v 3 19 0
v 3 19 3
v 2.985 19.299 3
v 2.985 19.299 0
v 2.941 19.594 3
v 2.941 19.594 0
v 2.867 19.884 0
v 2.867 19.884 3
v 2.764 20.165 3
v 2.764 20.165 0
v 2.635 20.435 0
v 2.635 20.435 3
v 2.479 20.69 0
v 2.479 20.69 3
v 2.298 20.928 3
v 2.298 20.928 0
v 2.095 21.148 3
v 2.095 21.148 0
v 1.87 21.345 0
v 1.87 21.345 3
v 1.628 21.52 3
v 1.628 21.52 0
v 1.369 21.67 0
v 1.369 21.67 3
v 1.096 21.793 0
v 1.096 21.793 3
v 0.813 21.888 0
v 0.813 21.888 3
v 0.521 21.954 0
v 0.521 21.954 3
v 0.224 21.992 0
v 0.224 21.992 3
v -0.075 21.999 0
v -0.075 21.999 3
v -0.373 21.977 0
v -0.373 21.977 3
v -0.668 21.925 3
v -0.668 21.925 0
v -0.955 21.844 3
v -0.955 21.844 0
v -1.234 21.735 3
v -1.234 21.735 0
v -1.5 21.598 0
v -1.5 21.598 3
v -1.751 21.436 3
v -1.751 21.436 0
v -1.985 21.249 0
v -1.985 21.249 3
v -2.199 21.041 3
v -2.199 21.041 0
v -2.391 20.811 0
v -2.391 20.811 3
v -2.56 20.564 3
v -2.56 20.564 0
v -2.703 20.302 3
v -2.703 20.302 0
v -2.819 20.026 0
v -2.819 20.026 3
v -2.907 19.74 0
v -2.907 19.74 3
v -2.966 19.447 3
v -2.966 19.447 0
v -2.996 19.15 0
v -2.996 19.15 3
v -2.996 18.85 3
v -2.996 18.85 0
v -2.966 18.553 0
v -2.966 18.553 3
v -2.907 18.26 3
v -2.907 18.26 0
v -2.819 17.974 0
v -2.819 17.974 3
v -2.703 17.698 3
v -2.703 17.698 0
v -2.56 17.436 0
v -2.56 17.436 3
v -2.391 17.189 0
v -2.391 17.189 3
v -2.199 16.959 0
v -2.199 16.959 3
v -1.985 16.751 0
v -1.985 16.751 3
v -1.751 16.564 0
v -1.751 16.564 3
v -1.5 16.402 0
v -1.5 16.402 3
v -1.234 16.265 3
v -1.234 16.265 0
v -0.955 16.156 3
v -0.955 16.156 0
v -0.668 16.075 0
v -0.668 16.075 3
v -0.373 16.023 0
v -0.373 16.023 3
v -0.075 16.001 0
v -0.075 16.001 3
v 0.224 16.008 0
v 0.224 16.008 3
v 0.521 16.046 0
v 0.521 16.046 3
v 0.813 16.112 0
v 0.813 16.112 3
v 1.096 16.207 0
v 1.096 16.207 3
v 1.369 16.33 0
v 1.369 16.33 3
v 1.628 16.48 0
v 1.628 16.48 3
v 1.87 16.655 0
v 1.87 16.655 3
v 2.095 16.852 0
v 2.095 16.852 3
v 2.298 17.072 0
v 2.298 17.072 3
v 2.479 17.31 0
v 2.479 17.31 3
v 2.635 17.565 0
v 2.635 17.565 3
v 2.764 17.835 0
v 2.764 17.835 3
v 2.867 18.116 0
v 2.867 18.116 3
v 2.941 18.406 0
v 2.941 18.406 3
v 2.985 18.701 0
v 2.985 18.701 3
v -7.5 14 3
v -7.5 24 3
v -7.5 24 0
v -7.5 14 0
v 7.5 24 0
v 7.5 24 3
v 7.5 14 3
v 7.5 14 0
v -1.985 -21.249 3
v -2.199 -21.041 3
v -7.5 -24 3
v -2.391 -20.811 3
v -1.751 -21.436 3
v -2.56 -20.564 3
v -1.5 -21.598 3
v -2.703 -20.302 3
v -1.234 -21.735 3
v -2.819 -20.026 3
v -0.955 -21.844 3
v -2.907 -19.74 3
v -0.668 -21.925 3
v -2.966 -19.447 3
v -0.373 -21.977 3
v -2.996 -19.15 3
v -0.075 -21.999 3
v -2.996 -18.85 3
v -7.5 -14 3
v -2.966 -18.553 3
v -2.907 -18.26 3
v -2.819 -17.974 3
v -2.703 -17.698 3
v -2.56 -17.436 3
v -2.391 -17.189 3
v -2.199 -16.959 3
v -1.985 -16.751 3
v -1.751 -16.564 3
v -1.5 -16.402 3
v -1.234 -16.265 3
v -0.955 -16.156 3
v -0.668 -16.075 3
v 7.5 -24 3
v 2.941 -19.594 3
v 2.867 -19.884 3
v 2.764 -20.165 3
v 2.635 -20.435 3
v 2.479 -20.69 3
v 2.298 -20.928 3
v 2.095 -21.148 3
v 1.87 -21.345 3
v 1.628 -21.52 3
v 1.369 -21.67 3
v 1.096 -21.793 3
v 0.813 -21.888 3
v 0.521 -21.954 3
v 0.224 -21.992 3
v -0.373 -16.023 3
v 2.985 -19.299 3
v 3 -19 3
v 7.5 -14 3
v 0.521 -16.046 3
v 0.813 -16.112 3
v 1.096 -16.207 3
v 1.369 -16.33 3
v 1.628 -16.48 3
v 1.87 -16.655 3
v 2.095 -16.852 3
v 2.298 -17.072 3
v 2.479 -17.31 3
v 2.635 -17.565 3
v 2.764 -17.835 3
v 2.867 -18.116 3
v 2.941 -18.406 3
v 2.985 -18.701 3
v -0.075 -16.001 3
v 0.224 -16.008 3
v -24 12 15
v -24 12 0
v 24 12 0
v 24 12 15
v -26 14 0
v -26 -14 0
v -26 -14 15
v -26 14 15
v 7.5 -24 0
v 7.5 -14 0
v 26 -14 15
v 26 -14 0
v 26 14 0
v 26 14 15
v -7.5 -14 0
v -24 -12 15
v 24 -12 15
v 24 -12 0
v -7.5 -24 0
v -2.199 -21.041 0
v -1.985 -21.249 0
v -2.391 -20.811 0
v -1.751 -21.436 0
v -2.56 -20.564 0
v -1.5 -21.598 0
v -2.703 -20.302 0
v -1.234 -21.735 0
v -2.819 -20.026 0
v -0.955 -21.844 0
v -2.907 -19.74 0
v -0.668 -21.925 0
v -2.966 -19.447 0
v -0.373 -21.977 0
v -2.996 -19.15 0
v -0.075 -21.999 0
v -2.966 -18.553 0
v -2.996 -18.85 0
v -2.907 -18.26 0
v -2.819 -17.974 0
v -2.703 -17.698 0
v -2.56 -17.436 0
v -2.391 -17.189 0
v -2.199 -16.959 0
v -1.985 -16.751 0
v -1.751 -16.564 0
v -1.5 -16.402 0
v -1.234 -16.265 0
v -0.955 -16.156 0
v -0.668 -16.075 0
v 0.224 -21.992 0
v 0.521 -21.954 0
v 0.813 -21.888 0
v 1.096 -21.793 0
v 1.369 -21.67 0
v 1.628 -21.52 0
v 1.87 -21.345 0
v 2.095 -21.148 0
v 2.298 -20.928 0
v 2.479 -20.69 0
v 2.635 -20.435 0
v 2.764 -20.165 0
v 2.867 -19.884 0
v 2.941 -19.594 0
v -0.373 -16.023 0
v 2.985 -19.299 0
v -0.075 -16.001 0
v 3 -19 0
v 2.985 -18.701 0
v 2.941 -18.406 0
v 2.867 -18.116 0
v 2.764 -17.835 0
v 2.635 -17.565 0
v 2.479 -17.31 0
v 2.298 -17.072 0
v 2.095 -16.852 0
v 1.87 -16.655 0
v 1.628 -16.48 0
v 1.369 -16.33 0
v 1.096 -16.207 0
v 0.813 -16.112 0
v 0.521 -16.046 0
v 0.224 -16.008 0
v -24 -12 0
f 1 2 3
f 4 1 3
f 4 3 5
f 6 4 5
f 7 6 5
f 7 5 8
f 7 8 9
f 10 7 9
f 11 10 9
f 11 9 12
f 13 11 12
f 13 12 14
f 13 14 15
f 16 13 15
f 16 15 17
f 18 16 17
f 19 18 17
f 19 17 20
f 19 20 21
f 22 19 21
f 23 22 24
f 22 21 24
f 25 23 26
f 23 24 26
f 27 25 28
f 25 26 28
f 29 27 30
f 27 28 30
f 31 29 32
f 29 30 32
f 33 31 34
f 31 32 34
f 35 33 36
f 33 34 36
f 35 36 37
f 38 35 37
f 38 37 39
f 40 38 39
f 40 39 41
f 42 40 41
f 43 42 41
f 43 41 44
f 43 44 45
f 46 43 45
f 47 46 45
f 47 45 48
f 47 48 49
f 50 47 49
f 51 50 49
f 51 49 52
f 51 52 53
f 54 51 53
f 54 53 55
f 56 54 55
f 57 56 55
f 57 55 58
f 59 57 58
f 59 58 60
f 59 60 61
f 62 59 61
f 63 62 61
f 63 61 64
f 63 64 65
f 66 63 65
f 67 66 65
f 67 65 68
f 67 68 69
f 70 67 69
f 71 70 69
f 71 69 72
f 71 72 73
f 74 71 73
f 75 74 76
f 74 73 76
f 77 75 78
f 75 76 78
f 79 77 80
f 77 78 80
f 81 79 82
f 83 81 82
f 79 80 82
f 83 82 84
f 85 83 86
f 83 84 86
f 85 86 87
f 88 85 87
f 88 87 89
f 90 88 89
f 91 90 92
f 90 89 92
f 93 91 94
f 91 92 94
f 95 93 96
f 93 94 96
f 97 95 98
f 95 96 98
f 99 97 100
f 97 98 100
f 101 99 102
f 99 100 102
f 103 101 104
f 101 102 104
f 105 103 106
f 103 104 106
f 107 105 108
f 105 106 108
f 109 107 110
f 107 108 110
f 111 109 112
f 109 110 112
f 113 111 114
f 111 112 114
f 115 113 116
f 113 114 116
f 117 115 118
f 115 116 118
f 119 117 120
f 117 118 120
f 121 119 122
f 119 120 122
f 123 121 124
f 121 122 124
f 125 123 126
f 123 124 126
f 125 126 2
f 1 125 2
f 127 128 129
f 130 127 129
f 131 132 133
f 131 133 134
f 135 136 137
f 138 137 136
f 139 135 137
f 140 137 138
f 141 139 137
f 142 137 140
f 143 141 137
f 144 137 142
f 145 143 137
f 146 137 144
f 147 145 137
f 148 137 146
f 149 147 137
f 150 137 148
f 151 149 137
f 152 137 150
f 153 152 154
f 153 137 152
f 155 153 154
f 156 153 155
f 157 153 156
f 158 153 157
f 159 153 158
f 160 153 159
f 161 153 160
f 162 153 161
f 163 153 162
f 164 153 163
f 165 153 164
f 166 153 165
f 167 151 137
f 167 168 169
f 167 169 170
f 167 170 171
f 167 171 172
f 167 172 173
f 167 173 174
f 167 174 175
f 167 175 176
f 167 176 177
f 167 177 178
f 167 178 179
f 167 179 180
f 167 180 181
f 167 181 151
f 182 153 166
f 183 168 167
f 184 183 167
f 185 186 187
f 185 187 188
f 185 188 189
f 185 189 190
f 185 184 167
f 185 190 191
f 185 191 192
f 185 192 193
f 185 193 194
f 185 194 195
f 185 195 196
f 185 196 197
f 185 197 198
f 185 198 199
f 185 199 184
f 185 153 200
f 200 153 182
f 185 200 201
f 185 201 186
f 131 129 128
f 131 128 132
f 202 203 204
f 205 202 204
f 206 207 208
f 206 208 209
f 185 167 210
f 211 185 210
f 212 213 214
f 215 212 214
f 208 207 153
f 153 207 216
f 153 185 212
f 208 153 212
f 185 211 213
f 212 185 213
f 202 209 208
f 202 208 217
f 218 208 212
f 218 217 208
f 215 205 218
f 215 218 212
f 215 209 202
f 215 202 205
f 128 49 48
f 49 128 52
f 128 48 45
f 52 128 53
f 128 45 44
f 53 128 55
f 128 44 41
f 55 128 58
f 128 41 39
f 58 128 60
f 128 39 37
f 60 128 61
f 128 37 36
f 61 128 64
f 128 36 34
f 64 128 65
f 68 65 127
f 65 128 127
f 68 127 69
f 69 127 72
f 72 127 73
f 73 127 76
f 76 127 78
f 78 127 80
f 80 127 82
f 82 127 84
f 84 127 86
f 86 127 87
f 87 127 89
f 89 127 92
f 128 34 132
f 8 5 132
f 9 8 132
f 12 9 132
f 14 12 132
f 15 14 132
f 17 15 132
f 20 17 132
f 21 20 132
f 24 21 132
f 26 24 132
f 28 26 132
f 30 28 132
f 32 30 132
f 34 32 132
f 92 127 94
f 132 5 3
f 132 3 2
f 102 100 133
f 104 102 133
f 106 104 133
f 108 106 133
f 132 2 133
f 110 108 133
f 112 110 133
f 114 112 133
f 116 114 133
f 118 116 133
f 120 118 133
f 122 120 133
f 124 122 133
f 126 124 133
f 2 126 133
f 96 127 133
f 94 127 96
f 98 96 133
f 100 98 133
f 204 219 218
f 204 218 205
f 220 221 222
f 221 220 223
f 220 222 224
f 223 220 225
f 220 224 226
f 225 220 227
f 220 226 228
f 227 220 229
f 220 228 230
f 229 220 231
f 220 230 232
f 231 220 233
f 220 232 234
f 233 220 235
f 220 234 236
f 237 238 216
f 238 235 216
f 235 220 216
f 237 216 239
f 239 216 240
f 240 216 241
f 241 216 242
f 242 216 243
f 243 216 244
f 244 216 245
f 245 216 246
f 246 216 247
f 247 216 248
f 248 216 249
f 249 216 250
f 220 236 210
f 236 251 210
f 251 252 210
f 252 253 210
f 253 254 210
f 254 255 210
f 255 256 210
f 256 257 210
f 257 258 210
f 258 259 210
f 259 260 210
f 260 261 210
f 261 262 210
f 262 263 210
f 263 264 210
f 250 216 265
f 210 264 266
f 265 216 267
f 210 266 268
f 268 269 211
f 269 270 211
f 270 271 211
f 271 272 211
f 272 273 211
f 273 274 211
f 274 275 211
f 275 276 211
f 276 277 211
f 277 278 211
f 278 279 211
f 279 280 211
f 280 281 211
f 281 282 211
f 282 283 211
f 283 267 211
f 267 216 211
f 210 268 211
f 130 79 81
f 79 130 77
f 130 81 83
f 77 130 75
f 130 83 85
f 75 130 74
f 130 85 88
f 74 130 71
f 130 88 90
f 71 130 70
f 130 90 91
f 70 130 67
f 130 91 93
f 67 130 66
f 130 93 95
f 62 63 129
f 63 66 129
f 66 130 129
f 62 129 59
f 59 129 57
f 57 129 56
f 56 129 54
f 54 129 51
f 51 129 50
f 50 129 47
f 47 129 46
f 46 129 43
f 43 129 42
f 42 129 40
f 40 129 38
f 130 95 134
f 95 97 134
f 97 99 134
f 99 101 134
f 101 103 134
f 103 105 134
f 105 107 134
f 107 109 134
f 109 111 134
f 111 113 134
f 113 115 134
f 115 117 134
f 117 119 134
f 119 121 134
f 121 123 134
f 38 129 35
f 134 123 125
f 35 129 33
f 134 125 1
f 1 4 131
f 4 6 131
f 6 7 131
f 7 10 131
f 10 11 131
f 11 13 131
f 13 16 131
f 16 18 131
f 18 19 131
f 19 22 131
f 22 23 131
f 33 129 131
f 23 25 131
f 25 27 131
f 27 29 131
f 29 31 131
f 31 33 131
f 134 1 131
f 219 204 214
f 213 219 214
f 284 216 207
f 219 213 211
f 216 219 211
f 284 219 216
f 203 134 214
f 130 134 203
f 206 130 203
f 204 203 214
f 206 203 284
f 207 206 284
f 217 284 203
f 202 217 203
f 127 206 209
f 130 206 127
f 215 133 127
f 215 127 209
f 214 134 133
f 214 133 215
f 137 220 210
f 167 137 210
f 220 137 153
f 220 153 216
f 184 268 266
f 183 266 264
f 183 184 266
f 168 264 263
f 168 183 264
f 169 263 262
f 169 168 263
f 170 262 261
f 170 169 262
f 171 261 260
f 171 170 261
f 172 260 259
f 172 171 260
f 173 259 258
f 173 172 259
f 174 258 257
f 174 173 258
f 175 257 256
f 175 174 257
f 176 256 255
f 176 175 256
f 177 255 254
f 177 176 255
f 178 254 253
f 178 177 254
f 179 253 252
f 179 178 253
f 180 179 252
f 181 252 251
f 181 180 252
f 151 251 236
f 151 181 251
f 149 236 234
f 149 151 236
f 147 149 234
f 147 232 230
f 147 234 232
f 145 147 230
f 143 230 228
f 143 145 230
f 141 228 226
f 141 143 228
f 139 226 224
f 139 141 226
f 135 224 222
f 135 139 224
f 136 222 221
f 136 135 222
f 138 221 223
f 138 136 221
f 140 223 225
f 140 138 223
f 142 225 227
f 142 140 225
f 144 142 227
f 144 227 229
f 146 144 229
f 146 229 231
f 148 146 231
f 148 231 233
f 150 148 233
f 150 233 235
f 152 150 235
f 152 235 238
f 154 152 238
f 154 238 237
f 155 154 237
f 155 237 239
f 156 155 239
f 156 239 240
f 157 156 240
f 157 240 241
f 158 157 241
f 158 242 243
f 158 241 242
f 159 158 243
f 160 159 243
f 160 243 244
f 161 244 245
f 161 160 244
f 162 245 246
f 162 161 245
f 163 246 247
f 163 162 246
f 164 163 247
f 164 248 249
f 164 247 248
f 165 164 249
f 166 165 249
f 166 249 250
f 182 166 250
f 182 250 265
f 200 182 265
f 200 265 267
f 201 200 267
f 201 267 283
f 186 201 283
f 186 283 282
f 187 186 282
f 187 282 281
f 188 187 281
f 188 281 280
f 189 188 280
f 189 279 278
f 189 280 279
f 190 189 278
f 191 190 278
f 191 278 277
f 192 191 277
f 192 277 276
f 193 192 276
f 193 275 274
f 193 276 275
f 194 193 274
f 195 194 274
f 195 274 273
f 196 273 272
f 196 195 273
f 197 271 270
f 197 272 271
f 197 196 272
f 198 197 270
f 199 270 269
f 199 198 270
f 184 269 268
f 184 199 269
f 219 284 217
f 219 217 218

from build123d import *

# Parameters (mm, degrees)
SKETCH_1_W          = 52
SKETCH_1_H          = 28
SKETCH_1_W_2        = 48
SKETCH_1_H_2        = 24
EXTRUDE_1_DEPTH     = 15
SKETCH_2_W          = 15
SKETCH_2_H          = 3
EXTRUDE_2_DEPTH     = 10
SKETCH_3_R          = 3
CUT_EXTRUDE_1_DEPTH = 10


with BuildPart() as part:
    # 草圖1 → 填料-伸長1 (new body)
    with BuildSketch(Plane.XY):
        Rectangle(SKETCH_1_W, SKETCH_1_H)
        Rectangle(SKETCH_1_W_2, SKETCH_1_H_2, mode=Mode.SUBTRACT)
    extrude(amount=EXTRUDE_1_DEPTH)

    # 草圖2 → 填料-伸長2 (add)
    with BuildSketch(Plane(origin=(0, 14, 0), x_dir=(1, 0, 0), z_dir=(0, 1, 0))):
        with Locations((0, -1.5)):
            Rectangle(SKETCH_2_W, SKETCH_2_H)
    extrude_2 = extrude(amount=EXTRUDE_2_DEPTH)

    # 草圖3 → 除料-伸長1 (cut)
    with BuildSketch(Plane.XY.offset(3)):
        with Locations((0, 19)):
            Circle(SKETCH_3_R)
    cut_extrude_1 = extrude(amount=-CUT_EXTRUDE_1_DEPTH, mode=Mode.SUBTRACT)

    # 鏡射1: 填料-伸長2, 除料-伸長1 across plane
    add(extrude_2.mirror(Plane.ZX))
    add(cut_extrude_1.mirror(Plane.ZX), mode=Mode.SUBTRACT)


solid = part.part
